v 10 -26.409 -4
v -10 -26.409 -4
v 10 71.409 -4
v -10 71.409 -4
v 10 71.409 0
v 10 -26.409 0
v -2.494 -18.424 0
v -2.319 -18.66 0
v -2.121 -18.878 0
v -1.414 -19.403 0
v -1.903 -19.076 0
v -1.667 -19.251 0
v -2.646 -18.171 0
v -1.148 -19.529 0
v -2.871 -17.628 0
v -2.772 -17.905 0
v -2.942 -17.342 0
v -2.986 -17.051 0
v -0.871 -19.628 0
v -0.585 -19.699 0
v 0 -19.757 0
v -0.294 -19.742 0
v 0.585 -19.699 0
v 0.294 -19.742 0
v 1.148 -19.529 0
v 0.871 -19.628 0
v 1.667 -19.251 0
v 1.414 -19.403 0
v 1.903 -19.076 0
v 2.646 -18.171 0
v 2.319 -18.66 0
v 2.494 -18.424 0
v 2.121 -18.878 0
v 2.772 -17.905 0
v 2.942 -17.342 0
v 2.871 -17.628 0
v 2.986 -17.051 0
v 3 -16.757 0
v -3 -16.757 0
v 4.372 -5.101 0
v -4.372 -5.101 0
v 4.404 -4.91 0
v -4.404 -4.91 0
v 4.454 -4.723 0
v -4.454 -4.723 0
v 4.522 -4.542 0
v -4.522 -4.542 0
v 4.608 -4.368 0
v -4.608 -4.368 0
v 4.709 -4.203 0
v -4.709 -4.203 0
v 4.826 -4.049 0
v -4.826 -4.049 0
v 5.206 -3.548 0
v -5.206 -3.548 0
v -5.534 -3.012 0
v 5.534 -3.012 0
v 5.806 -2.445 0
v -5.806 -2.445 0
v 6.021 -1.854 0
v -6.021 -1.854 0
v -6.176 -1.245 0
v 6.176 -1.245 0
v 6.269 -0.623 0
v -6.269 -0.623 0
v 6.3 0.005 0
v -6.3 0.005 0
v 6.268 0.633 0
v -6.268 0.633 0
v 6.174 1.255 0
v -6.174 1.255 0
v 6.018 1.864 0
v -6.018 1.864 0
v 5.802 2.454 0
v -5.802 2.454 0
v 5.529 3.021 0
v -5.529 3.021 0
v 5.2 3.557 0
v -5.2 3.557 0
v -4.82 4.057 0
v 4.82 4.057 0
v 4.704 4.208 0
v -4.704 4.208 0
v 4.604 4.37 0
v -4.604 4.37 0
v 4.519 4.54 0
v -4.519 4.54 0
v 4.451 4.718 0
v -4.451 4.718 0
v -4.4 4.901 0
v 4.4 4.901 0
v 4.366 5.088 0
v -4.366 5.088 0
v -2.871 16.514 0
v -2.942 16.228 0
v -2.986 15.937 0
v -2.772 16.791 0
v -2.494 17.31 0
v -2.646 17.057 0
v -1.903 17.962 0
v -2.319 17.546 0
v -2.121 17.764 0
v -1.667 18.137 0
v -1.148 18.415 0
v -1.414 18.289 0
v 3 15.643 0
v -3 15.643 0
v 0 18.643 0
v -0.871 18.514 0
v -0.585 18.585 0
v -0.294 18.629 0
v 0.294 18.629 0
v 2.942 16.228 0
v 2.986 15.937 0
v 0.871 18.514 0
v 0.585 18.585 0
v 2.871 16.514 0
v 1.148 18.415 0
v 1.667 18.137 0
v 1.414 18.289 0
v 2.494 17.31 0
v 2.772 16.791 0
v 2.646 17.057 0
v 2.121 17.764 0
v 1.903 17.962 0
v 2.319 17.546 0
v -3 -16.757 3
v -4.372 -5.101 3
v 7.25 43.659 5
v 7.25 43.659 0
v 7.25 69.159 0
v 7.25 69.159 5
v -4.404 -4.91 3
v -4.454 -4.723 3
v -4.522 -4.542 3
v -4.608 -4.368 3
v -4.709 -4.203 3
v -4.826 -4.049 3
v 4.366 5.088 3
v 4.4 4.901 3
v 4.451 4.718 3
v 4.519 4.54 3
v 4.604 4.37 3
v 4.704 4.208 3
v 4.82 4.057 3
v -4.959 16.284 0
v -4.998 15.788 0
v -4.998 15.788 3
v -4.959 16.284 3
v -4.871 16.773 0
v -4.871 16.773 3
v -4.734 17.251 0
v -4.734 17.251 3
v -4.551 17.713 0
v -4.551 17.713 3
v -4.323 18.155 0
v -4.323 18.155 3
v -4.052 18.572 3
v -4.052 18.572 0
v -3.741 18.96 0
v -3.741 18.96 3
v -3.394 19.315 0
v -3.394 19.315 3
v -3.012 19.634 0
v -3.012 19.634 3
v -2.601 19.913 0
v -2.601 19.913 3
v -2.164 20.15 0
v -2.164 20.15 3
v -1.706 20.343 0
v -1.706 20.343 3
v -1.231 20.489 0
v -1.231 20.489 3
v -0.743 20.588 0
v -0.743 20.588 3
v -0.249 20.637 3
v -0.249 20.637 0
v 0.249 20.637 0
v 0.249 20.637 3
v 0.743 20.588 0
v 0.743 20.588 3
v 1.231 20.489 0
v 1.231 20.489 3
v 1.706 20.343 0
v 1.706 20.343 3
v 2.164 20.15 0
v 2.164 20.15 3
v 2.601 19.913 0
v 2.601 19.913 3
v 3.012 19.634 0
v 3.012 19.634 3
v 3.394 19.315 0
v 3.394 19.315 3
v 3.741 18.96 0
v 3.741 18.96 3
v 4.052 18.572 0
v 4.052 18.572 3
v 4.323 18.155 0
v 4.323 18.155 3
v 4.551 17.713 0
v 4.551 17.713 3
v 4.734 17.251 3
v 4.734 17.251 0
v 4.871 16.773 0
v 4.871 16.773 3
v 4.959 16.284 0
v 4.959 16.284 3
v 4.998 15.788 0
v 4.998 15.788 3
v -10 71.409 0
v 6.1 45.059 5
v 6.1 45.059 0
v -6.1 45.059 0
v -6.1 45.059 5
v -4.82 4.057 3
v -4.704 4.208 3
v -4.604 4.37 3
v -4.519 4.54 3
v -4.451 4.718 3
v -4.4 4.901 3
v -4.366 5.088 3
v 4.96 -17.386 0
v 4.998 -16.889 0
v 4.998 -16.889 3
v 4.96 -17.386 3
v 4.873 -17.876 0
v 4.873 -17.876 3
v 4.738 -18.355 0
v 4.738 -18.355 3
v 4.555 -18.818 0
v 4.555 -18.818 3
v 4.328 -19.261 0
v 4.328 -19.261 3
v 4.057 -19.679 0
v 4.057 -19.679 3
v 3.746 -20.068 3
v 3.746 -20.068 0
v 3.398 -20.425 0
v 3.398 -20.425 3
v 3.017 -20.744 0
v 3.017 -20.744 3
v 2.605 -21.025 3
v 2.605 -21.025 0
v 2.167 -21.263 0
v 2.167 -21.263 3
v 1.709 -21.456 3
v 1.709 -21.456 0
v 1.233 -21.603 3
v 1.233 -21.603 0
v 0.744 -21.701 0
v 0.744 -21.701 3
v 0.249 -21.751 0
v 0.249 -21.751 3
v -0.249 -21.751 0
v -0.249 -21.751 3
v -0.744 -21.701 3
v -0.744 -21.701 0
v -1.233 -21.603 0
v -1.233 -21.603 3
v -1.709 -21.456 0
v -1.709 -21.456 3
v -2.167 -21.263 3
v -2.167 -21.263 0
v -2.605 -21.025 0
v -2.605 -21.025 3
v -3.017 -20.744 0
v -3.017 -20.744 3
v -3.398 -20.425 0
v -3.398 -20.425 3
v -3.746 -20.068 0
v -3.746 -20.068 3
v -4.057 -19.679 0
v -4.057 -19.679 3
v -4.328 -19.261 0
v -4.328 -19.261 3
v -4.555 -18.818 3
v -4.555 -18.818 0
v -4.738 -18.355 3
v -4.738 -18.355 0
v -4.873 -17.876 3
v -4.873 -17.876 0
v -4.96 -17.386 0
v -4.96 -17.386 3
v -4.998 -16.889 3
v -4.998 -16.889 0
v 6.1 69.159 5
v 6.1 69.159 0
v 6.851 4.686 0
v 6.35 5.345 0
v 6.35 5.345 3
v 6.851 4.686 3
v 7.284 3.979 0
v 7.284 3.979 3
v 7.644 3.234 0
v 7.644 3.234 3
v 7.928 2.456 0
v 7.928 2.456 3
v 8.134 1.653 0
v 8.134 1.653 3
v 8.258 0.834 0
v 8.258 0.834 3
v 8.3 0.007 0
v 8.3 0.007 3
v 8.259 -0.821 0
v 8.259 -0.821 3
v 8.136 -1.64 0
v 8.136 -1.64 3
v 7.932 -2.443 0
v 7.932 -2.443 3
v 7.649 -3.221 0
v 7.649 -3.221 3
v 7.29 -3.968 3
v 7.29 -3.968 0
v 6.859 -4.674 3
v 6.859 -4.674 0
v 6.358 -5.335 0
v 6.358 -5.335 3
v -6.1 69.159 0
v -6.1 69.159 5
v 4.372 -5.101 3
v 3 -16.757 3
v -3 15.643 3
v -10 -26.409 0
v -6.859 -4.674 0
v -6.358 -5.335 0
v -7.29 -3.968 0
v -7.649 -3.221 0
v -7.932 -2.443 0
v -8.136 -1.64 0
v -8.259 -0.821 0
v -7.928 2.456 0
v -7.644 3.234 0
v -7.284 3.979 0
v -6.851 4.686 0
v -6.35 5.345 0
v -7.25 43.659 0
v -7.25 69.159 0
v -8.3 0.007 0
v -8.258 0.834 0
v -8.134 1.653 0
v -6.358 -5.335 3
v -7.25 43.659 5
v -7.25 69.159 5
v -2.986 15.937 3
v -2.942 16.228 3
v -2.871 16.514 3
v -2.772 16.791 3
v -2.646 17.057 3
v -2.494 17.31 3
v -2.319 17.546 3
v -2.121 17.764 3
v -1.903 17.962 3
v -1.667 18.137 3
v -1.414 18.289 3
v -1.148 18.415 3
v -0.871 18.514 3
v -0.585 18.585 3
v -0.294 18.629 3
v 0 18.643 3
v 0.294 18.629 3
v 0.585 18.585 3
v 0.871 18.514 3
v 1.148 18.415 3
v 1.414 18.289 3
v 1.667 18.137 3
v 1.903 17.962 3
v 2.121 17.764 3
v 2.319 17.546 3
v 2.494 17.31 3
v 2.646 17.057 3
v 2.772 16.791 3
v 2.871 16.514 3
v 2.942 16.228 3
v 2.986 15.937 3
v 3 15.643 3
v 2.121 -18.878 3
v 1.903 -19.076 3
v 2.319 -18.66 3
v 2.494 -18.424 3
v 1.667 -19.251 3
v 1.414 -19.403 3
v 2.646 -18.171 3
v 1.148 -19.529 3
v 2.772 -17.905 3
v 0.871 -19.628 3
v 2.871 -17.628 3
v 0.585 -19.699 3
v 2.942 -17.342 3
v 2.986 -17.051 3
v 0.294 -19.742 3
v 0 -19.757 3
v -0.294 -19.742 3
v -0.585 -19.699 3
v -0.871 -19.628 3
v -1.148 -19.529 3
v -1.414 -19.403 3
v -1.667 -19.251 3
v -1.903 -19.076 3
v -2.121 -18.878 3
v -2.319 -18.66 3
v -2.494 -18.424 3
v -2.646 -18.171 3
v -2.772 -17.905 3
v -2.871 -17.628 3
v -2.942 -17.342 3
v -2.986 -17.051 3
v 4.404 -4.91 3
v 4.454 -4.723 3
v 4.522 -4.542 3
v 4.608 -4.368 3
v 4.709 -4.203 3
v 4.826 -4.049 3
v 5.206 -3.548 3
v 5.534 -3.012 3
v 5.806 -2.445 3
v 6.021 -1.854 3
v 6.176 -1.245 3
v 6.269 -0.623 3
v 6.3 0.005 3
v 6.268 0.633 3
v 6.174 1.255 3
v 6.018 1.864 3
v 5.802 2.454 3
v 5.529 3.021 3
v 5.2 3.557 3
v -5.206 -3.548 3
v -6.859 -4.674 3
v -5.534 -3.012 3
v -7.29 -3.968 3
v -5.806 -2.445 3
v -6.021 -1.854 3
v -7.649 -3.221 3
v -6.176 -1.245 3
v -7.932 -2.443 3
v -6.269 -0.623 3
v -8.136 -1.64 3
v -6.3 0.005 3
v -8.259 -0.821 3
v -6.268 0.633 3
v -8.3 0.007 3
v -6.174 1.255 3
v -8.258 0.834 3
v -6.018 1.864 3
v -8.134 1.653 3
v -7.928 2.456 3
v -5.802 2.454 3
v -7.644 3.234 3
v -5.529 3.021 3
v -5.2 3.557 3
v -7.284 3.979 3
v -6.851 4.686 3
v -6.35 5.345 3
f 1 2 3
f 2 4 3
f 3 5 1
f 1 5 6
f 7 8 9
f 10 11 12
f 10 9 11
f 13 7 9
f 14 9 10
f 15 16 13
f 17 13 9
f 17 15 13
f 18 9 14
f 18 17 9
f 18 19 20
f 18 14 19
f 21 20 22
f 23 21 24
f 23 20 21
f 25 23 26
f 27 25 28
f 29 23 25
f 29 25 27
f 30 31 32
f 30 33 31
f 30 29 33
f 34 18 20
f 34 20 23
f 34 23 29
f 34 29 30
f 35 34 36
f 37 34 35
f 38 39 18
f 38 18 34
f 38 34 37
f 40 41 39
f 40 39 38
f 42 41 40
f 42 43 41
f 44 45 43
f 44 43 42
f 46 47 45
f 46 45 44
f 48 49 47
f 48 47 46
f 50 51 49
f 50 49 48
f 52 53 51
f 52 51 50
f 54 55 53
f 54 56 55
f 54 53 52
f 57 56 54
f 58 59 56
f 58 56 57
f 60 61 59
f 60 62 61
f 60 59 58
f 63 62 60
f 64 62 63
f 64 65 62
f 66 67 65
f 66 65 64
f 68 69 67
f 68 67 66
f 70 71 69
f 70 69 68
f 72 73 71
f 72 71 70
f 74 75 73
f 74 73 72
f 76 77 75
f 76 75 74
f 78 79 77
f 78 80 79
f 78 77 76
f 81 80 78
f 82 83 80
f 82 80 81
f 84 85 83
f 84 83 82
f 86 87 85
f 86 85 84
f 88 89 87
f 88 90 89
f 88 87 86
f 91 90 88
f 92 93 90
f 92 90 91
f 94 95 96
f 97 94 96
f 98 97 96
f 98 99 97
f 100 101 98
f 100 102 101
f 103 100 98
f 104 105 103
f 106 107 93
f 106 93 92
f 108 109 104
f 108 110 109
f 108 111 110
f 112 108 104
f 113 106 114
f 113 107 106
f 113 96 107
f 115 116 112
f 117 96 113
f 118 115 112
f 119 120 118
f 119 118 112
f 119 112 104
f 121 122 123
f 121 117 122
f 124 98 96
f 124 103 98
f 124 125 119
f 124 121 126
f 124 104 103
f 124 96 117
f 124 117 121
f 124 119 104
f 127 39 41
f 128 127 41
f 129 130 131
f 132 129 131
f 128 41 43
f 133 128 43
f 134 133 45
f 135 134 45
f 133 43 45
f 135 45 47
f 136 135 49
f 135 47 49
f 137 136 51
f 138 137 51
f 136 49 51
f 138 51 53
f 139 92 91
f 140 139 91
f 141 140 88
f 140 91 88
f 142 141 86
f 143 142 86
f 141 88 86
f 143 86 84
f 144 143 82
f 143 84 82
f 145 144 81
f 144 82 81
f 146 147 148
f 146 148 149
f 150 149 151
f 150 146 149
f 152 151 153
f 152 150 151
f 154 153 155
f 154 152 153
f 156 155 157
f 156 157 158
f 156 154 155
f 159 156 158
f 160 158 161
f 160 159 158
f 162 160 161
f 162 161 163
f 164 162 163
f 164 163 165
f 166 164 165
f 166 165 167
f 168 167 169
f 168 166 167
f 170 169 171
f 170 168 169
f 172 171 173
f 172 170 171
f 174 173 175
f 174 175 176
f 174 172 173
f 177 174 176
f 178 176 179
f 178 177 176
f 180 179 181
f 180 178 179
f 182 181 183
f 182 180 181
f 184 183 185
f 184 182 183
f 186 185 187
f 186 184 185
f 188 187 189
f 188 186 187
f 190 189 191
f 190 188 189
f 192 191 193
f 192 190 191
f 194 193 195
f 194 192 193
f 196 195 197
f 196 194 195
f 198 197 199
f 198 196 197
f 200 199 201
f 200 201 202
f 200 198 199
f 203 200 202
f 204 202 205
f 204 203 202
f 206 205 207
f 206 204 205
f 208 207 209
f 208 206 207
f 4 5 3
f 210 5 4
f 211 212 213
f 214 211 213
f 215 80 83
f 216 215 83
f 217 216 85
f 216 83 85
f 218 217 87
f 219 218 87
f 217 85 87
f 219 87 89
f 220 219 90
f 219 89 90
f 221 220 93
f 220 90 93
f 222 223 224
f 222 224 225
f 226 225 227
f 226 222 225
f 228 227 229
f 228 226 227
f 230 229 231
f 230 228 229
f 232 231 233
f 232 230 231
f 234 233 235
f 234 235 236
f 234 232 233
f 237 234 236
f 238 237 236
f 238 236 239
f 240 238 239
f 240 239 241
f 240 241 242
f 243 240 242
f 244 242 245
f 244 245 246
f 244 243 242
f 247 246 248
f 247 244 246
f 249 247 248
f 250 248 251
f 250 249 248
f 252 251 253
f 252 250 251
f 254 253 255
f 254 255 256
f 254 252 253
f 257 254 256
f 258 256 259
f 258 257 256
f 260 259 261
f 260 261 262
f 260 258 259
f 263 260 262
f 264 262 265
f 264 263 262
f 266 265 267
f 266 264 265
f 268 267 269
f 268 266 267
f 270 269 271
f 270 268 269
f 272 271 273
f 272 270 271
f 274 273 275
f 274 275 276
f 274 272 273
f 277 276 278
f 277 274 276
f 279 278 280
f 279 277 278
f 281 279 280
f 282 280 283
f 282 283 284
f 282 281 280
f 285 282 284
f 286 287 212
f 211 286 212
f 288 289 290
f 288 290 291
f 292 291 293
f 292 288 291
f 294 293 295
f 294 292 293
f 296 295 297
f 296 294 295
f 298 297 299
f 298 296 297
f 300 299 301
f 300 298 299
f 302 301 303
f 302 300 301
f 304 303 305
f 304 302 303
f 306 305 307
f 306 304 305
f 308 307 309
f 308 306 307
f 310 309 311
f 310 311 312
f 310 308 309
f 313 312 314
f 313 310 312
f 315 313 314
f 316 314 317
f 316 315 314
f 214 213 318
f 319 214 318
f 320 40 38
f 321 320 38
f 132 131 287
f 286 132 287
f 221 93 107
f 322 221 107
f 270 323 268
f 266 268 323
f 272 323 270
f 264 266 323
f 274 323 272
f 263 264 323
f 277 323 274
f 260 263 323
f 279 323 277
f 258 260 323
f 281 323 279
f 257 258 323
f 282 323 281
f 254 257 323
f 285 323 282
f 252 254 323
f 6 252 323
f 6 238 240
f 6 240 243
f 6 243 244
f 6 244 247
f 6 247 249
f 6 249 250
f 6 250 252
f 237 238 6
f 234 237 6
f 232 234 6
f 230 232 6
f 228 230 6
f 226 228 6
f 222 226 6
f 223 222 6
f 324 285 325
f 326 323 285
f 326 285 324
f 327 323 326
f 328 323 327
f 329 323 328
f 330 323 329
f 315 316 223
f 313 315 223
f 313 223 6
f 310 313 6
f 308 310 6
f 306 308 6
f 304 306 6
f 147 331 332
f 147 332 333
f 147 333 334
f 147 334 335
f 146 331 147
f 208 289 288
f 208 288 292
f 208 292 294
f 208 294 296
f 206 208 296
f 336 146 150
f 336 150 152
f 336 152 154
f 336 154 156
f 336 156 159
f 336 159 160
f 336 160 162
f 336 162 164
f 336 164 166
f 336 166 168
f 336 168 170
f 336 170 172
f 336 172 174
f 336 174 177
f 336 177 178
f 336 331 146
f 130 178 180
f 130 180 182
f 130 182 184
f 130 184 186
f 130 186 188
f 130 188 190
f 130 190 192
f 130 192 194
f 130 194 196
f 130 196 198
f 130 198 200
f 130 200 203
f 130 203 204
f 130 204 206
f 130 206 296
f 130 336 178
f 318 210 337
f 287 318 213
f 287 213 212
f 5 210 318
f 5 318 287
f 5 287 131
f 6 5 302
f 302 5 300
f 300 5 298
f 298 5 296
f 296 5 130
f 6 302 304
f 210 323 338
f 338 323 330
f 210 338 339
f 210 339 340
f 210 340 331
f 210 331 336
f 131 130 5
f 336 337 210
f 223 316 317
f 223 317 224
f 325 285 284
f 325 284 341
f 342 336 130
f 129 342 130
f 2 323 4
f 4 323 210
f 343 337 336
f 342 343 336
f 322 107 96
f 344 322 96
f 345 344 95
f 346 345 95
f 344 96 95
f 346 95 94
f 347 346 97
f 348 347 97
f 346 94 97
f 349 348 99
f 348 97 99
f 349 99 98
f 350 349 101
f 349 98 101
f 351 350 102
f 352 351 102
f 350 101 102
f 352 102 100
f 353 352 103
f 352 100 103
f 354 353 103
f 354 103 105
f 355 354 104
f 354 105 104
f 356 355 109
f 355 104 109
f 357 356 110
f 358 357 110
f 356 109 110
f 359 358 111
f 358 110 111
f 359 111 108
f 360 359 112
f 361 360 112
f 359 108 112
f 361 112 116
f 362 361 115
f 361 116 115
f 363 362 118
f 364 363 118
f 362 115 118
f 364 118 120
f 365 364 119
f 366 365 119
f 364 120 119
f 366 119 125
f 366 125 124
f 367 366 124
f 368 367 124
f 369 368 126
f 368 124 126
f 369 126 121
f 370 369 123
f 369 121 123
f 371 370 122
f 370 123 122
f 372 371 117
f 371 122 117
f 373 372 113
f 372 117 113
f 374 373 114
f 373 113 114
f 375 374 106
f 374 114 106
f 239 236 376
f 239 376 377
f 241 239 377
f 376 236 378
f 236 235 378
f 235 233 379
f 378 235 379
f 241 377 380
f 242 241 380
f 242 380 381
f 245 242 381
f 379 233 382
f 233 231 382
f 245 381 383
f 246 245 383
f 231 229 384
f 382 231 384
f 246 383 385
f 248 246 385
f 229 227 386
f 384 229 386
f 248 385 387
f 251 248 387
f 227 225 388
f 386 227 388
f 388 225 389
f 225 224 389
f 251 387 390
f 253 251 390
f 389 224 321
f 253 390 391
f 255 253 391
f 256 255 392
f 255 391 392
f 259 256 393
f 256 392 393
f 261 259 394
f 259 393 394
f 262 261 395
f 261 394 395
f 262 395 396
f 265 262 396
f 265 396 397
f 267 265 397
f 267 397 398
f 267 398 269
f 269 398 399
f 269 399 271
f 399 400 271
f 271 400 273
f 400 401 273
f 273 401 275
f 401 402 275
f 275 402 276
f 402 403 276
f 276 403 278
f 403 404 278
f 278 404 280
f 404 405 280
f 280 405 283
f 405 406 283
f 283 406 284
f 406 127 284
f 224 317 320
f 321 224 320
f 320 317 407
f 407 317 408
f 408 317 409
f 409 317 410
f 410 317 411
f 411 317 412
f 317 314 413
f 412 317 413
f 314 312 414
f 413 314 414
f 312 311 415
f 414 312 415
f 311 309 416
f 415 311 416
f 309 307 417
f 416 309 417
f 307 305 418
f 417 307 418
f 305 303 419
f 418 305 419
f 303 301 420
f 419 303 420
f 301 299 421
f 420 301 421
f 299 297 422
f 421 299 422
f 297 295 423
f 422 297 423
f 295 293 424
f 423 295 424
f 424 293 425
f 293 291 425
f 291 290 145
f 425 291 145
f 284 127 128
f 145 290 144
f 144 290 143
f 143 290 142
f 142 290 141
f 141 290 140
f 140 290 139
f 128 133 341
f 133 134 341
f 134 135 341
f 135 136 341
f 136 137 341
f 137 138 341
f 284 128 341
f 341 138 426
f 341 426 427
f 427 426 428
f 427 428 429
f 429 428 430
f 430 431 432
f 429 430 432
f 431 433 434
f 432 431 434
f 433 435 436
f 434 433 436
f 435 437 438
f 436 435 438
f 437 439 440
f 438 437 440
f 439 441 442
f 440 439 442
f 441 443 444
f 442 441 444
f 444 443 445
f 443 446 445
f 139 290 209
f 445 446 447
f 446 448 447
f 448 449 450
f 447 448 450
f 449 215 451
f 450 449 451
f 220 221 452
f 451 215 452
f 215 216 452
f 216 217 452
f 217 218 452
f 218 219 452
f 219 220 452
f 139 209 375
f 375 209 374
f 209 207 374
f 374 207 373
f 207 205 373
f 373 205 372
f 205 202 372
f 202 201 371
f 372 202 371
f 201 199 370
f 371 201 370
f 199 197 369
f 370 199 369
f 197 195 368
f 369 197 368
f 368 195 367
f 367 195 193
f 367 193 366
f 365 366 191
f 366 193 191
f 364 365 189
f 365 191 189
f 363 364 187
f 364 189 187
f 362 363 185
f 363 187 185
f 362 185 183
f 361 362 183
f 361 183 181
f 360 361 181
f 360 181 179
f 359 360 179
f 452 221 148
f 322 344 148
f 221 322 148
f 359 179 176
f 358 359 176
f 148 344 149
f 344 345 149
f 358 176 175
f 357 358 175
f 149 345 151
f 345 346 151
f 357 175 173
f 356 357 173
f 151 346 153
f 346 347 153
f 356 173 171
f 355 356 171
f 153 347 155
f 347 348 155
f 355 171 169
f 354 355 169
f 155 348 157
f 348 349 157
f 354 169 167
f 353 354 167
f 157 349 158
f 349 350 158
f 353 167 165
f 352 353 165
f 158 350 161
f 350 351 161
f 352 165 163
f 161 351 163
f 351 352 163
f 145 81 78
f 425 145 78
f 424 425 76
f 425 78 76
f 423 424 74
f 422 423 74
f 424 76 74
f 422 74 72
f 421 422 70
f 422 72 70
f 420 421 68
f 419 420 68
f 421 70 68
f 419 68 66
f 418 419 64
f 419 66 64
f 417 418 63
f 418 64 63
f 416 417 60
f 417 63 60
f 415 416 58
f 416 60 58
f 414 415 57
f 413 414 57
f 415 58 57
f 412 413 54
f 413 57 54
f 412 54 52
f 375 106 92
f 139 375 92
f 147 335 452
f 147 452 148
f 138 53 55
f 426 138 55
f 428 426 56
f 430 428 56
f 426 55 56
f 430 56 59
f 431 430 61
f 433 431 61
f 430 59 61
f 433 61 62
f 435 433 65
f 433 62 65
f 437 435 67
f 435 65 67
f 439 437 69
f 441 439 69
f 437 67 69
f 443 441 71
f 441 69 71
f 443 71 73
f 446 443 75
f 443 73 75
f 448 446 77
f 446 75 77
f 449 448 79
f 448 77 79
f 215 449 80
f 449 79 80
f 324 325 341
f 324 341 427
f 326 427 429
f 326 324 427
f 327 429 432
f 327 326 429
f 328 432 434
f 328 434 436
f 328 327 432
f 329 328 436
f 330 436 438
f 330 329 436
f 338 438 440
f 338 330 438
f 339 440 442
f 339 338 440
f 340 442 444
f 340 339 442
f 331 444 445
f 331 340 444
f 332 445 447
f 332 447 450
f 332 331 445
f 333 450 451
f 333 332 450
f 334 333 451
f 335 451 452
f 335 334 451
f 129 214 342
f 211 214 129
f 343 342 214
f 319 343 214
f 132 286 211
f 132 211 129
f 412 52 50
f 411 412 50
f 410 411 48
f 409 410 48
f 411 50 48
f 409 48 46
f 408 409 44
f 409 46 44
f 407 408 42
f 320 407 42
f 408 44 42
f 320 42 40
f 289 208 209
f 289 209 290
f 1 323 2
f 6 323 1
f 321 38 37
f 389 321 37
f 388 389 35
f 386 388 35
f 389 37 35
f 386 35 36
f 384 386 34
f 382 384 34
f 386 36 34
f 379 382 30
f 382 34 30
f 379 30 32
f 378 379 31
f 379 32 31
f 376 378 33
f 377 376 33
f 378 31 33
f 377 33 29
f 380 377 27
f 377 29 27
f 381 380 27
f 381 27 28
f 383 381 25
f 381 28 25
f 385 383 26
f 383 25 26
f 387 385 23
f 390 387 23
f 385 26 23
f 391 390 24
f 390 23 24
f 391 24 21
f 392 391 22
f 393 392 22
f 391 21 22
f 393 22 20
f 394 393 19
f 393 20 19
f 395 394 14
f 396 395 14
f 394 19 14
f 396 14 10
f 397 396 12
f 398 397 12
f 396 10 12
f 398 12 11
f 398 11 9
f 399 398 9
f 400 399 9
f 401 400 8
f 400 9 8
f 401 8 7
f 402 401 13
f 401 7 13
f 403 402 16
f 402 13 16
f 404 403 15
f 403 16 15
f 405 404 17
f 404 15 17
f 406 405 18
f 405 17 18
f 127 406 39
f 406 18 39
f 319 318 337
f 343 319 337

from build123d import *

# Parameters (mm, degrees)
BOSS_EXTRUDE1_DEPTH = 3
BOSS_EXTRUDE2_DEPTH = 4
BOSS_EXTRUDE3_DEPTH = 5


with BuildPart() as part:
    # Sketch1 → Boss-Extrude1 (new body)
    with BuildSketch(Plane.XY):
        with BuildLine():
            Line((-6.349735442, 5.345171636), (-4.997891213, 15.788269553))
            ThreePointArc((-4.997891213, 15.788269553), (0, 20.643068224), (4.997891213, 15.788269553))
            Line((4.997891213, 15.788269553), (6.349735442, 5.345171636))
            ThreePointArc((6.349735442, 5.345171636), (8.299997248, 0.006758739), (6.358432228, -5.334823296))
            Line((6.358432228, -5.334823296), (4.998253221, -16.889085995))
            ThreePointArc((4.998253221, -16.889085995), (0, -21.756931776), (-4.998253221, -16.889085995))
            Line((-4.998253221, -16.889085995), (-6.358432228, -5.334823296))
            ThreePointArc((-6.358432228, -5.334823296), (-8.299997248, 0.006758739), (-6.349735442, 5.345171636))
        make_face()
        with BuildLine():
            Line((-4.36628468, 5.088416745), (-3, 15.643068224))
            ThreePointArc((-3, 15.643068224), (0, 18.643068224), (3, 15.643068224))
            Line((3, 15.643068224), (4.36628468, 5.088416745))
            ThreePointArc((4.36628468, 5.088416745), (4.518875856, 4.540216249), (4.819678709, 4.057178471))
            ThreePointArc((4.819678709, 4.057178471), (6.299997911, 0.005130128), (4.826279884, -4.049323707))
            ThreePointArc((4.826279884, -4.049323707), (4.522307907, -4.541950371), (4.37214806, -5.100995998))
            Line((4.37214806, -5.100995998), (3, -16.756931776))
            ThreePointArc((3, -16.756931776), (0, -19.756931776), (-3, -16.756931776))
            Line((-3, -16.756931776), (-4.37214806, -5.100995998))
            ThreePointArc((-4.37214806, -5.100995998), (-4.522307907, -4.541950371), (-4.826279884, -4.049323707))
            ThreePointArc((-4.826279884, -4.049323707), (-6.299997911, 0.005130128), (-4.819678709, 4.057178471))
            ThreePointArc((-4.819678709, 4.057178471), (-4.518875856, 4.540216249), (-4.36628468, 5.088416745))
        make_face(mode=Mode.SUBTRACT)
    extrude(amount=BOSS_EXTRUDE1_DEPTH)

    # Sketch2 → Boss-Extrude2 (add)
    with BuildSketch(Plane(origin=(0, 0, 0), x_dir=(-1, 0, 0), z_dir=(0, 0, -1))):
        Polygon((10, -26.40946304), (-10, -26.40946304), (-10, 26.40946304), (-10, 71.40946304), (10, 71.40946304), (10, 26.40946304), align=None)
    extrude(amount=BOSS_EXTRUDE2_DEPTH)

    # Sketch3 → Boss-Extrude3 (add)
    with BuildSketch(Plane.XY):
        Polygon((7.25, 69.15946304), (6.1, 69.15946304), (6.1, 67.75946304), (6.1, 45.05946304), (-6.1, 45.05946304), (-6.1, 67.75946304), (-6.1, 69.15946304), (-7.25, 69.15946304), (-7.25, 43.65946304), (7.25, 43.65946304), align=None)
    extrude(amount=BOSS_EXTRUDE3_DEPTH)


solid = part.part
